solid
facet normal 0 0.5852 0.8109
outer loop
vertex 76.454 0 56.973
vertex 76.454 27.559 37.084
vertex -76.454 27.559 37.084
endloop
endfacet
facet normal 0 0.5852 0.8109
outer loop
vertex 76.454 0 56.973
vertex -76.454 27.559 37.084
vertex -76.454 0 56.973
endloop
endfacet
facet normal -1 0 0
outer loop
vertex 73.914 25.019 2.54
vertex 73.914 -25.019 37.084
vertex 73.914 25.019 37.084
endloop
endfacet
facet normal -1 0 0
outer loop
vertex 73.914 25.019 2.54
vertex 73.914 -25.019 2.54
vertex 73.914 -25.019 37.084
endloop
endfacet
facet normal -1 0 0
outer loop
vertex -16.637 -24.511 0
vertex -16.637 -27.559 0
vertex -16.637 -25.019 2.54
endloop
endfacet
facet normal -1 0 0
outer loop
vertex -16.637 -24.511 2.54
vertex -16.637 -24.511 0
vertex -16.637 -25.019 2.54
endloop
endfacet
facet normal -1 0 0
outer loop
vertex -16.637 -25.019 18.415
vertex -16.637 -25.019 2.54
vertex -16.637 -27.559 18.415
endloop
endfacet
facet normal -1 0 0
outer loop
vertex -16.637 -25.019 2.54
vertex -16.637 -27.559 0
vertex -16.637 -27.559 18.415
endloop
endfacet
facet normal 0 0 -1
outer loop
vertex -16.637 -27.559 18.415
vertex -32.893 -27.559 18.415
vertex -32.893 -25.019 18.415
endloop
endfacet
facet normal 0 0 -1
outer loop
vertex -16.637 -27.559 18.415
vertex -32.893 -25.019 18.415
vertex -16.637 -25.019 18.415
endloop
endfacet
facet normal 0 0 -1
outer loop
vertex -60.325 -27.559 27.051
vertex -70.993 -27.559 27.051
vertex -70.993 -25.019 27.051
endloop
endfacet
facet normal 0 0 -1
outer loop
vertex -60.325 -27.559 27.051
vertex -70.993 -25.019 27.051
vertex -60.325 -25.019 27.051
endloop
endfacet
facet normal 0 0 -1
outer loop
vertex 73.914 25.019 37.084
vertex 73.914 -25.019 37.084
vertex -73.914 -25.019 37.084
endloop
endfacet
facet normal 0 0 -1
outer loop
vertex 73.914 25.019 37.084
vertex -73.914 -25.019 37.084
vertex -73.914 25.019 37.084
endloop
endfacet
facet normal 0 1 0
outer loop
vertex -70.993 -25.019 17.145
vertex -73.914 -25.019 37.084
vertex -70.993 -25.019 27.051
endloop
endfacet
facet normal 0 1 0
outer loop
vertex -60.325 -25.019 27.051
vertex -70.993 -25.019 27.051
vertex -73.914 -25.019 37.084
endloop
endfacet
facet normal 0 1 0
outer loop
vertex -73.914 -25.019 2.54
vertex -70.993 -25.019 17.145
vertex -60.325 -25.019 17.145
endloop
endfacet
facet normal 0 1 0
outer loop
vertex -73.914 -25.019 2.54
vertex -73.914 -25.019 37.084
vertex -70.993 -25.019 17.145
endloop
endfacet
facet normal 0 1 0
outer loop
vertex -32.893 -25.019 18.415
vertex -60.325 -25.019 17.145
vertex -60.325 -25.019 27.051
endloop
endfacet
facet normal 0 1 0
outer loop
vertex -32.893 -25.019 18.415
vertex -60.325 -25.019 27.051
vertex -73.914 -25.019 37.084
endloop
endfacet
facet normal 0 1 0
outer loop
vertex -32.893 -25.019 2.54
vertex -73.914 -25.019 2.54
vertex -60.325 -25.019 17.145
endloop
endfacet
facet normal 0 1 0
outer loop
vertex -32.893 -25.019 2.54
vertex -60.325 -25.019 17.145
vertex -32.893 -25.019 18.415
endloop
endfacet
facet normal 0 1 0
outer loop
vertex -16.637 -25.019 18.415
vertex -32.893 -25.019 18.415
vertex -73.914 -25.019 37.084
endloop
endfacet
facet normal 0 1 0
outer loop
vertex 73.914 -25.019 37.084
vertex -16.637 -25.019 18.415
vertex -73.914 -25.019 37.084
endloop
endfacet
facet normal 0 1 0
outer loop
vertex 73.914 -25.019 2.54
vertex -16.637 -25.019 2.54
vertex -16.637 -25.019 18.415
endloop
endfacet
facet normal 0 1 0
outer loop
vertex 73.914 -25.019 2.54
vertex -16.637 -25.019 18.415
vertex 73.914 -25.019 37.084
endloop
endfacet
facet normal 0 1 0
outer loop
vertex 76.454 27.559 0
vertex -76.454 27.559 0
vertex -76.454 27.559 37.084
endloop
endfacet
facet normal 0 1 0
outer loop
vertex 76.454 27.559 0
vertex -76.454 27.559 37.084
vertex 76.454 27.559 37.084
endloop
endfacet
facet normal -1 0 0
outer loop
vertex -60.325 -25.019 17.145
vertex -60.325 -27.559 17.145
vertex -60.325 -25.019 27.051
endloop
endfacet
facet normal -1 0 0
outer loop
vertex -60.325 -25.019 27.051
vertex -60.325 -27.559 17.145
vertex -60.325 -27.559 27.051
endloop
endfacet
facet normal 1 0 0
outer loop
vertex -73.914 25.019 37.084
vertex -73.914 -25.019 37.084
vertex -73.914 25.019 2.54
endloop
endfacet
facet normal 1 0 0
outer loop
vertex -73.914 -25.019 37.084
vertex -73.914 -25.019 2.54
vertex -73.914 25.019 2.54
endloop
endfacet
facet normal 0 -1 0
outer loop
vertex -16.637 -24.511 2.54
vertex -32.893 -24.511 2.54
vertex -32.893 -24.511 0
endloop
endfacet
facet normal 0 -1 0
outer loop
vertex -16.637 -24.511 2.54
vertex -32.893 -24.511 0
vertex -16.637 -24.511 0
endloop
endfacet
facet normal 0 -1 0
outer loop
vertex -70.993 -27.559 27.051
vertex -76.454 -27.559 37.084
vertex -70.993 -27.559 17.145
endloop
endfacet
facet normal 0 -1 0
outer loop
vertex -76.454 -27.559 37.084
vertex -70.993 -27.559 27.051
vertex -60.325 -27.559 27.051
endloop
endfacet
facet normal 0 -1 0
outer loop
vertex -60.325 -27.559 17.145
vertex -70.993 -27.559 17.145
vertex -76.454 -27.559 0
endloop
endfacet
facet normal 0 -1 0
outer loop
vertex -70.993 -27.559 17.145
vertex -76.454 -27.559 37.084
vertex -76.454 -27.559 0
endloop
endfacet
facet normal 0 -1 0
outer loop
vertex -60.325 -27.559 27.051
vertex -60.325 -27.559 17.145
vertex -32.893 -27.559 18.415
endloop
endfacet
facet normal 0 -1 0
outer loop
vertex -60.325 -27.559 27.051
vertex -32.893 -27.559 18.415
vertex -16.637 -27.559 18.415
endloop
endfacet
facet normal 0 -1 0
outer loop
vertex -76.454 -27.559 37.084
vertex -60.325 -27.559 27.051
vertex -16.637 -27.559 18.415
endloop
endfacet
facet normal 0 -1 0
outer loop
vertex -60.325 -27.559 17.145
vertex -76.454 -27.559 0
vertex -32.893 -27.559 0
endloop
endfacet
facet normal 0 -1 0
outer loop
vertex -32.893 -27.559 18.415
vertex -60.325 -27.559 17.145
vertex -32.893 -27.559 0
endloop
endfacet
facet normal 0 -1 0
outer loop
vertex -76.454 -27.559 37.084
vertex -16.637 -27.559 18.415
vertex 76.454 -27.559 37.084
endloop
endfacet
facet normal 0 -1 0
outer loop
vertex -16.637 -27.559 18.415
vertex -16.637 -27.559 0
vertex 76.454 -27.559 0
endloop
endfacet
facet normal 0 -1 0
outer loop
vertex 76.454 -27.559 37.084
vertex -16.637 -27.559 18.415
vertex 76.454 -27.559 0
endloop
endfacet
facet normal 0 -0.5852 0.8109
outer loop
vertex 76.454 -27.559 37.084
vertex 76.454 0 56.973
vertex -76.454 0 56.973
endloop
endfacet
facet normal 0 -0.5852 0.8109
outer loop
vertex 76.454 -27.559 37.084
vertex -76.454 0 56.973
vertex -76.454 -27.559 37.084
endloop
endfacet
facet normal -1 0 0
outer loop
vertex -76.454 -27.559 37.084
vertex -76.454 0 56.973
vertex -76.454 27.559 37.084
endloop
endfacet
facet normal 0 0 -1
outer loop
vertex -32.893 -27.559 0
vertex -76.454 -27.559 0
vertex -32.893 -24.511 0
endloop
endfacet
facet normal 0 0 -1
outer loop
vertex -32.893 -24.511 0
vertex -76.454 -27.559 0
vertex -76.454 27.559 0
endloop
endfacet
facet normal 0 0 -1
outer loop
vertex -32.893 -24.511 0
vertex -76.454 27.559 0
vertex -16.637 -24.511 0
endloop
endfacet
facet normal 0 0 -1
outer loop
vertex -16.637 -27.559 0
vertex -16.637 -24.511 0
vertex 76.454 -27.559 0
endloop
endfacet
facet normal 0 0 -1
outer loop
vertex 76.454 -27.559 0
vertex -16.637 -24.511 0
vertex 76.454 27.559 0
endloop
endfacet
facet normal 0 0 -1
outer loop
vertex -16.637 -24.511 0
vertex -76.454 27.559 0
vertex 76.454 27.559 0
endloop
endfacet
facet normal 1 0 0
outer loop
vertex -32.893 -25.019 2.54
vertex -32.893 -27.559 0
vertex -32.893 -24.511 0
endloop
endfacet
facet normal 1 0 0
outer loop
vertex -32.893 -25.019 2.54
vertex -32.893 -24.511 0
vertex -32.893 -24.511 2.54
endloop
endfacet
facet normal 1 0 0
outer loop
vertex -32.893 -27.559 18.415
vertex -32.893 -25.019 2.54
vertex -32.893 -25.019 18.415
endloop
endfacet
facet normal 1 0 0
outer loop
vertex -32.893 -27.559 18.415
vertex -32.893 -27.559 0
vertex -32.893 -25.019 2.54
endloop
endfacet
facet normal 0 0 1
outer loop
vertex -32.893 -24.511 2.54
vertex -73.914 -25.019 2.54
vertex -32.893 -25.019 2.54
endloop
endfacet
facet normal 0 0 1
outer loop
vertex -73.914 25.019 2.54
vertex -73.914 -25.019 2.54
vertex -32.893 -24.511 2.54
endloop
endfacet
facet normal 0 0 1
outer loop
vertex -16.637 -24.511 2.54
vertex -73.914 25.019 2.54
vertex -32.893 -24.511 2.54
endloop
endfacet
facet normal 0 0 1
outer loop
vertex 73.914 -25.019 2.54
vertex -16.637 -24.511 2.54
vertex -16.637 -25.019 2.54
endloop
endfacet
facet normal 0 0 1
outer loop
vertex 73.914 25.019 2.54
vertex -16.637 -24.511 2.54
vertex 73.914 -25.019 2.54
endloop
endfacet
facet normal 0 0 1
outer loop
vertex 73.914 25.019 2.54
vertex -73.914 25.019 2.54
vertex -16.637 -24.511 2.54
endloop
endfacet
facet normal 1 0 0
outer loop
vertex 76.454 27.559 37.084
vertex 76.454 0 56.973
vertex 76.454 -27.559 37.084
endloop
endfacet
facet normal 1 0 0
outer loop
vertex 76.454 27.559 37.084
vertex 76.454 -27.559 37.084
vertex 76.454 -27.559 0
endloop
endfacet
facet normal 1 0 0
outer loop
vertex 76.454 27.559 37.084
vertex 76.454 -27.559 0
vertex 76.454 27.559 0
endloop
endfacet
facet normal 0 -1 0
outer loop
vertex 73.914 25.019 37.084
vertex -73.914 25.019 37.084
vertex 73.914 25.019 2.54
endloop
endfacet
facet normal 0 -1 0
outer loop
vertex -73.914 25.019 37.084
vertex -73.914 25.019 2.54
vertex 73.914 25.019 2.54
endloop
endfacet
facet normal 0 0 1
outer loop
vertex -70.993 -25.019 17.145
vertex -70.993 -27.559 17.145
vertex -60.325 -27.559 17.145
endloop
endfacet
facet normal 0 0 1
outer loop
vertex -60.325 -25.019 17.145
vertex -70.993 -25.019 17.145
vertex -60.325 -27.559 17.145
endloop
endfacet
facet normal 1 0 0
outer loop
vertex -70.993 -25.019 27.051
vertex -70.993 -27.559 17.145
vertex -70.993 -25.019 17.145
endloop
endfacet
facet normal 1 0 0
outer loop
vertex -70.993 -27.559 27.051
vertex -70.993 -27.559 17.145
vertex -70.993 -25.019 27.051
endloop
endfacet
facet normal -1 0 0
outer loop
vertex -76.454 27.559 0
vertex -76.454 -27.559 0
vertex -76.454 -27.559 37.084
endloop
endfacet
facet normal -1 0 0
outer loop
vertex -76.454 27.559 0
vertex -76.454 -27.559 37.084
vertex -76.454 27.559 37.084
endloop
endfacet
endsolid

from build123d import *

# Parameters (mm, degrees)
F0_W     = 152.907998
F0_H     = 55.118002
F1_DEPTH = 37.084
F2_T     = -2.54
F3_W     = 16.256001
F3_H     = 18.415
F4_DEPTH = 3.048
F6_DEPTH = 152.908
F7_W     = 10.667999
F7_H     = 9.906002
F8_DEPTH = 2.794


with BuildPart() as f1:
    # F0 (on Top) → F1 (new body)
    with BuildSketch(Plane.XY):
        Rectangle(F0_W, F0_H)
    extrude(amount=F1_DEPTH)

    # F2
    f2_openings = [f1.faces().sort_by_distance(p)[0] for p in [
        (0, 0, 37.084),
    ]]
    offset(amount=F2_T, openings=f2_openings)

    # F3 (on face) → F4 (cut)
    with BuildSketch(Plane.XZ.offset(27.559001)):
        with Locations((-24.765001, 9.2075)):
            Rectangle(F3_W, F3_H)
    extrude(amount=-F4_DEPTH, mode=Mode.SUBTRACT)

    # F5 (on face) → F6 (join)
    with BuildSketch(Plane.YZ.offset(76.453999)):
        Polygon((27.559001, 37.084), (0, 56.972686), (-27.559001, 37.084), align=None)
    extrude(amount=-F6_DEPTH)

    # F7 (on face) → F8 (cut)
    with BuildSketch(Plane.XZ.offset(27.559001)):
        with Locations((-65.658999, 22.098001)):
            Rectangle(F7_W, F7_H)
    extrude(amount=-F8_DEPTH, mode=Mode.SUBTRACT)


solid = f1.part
